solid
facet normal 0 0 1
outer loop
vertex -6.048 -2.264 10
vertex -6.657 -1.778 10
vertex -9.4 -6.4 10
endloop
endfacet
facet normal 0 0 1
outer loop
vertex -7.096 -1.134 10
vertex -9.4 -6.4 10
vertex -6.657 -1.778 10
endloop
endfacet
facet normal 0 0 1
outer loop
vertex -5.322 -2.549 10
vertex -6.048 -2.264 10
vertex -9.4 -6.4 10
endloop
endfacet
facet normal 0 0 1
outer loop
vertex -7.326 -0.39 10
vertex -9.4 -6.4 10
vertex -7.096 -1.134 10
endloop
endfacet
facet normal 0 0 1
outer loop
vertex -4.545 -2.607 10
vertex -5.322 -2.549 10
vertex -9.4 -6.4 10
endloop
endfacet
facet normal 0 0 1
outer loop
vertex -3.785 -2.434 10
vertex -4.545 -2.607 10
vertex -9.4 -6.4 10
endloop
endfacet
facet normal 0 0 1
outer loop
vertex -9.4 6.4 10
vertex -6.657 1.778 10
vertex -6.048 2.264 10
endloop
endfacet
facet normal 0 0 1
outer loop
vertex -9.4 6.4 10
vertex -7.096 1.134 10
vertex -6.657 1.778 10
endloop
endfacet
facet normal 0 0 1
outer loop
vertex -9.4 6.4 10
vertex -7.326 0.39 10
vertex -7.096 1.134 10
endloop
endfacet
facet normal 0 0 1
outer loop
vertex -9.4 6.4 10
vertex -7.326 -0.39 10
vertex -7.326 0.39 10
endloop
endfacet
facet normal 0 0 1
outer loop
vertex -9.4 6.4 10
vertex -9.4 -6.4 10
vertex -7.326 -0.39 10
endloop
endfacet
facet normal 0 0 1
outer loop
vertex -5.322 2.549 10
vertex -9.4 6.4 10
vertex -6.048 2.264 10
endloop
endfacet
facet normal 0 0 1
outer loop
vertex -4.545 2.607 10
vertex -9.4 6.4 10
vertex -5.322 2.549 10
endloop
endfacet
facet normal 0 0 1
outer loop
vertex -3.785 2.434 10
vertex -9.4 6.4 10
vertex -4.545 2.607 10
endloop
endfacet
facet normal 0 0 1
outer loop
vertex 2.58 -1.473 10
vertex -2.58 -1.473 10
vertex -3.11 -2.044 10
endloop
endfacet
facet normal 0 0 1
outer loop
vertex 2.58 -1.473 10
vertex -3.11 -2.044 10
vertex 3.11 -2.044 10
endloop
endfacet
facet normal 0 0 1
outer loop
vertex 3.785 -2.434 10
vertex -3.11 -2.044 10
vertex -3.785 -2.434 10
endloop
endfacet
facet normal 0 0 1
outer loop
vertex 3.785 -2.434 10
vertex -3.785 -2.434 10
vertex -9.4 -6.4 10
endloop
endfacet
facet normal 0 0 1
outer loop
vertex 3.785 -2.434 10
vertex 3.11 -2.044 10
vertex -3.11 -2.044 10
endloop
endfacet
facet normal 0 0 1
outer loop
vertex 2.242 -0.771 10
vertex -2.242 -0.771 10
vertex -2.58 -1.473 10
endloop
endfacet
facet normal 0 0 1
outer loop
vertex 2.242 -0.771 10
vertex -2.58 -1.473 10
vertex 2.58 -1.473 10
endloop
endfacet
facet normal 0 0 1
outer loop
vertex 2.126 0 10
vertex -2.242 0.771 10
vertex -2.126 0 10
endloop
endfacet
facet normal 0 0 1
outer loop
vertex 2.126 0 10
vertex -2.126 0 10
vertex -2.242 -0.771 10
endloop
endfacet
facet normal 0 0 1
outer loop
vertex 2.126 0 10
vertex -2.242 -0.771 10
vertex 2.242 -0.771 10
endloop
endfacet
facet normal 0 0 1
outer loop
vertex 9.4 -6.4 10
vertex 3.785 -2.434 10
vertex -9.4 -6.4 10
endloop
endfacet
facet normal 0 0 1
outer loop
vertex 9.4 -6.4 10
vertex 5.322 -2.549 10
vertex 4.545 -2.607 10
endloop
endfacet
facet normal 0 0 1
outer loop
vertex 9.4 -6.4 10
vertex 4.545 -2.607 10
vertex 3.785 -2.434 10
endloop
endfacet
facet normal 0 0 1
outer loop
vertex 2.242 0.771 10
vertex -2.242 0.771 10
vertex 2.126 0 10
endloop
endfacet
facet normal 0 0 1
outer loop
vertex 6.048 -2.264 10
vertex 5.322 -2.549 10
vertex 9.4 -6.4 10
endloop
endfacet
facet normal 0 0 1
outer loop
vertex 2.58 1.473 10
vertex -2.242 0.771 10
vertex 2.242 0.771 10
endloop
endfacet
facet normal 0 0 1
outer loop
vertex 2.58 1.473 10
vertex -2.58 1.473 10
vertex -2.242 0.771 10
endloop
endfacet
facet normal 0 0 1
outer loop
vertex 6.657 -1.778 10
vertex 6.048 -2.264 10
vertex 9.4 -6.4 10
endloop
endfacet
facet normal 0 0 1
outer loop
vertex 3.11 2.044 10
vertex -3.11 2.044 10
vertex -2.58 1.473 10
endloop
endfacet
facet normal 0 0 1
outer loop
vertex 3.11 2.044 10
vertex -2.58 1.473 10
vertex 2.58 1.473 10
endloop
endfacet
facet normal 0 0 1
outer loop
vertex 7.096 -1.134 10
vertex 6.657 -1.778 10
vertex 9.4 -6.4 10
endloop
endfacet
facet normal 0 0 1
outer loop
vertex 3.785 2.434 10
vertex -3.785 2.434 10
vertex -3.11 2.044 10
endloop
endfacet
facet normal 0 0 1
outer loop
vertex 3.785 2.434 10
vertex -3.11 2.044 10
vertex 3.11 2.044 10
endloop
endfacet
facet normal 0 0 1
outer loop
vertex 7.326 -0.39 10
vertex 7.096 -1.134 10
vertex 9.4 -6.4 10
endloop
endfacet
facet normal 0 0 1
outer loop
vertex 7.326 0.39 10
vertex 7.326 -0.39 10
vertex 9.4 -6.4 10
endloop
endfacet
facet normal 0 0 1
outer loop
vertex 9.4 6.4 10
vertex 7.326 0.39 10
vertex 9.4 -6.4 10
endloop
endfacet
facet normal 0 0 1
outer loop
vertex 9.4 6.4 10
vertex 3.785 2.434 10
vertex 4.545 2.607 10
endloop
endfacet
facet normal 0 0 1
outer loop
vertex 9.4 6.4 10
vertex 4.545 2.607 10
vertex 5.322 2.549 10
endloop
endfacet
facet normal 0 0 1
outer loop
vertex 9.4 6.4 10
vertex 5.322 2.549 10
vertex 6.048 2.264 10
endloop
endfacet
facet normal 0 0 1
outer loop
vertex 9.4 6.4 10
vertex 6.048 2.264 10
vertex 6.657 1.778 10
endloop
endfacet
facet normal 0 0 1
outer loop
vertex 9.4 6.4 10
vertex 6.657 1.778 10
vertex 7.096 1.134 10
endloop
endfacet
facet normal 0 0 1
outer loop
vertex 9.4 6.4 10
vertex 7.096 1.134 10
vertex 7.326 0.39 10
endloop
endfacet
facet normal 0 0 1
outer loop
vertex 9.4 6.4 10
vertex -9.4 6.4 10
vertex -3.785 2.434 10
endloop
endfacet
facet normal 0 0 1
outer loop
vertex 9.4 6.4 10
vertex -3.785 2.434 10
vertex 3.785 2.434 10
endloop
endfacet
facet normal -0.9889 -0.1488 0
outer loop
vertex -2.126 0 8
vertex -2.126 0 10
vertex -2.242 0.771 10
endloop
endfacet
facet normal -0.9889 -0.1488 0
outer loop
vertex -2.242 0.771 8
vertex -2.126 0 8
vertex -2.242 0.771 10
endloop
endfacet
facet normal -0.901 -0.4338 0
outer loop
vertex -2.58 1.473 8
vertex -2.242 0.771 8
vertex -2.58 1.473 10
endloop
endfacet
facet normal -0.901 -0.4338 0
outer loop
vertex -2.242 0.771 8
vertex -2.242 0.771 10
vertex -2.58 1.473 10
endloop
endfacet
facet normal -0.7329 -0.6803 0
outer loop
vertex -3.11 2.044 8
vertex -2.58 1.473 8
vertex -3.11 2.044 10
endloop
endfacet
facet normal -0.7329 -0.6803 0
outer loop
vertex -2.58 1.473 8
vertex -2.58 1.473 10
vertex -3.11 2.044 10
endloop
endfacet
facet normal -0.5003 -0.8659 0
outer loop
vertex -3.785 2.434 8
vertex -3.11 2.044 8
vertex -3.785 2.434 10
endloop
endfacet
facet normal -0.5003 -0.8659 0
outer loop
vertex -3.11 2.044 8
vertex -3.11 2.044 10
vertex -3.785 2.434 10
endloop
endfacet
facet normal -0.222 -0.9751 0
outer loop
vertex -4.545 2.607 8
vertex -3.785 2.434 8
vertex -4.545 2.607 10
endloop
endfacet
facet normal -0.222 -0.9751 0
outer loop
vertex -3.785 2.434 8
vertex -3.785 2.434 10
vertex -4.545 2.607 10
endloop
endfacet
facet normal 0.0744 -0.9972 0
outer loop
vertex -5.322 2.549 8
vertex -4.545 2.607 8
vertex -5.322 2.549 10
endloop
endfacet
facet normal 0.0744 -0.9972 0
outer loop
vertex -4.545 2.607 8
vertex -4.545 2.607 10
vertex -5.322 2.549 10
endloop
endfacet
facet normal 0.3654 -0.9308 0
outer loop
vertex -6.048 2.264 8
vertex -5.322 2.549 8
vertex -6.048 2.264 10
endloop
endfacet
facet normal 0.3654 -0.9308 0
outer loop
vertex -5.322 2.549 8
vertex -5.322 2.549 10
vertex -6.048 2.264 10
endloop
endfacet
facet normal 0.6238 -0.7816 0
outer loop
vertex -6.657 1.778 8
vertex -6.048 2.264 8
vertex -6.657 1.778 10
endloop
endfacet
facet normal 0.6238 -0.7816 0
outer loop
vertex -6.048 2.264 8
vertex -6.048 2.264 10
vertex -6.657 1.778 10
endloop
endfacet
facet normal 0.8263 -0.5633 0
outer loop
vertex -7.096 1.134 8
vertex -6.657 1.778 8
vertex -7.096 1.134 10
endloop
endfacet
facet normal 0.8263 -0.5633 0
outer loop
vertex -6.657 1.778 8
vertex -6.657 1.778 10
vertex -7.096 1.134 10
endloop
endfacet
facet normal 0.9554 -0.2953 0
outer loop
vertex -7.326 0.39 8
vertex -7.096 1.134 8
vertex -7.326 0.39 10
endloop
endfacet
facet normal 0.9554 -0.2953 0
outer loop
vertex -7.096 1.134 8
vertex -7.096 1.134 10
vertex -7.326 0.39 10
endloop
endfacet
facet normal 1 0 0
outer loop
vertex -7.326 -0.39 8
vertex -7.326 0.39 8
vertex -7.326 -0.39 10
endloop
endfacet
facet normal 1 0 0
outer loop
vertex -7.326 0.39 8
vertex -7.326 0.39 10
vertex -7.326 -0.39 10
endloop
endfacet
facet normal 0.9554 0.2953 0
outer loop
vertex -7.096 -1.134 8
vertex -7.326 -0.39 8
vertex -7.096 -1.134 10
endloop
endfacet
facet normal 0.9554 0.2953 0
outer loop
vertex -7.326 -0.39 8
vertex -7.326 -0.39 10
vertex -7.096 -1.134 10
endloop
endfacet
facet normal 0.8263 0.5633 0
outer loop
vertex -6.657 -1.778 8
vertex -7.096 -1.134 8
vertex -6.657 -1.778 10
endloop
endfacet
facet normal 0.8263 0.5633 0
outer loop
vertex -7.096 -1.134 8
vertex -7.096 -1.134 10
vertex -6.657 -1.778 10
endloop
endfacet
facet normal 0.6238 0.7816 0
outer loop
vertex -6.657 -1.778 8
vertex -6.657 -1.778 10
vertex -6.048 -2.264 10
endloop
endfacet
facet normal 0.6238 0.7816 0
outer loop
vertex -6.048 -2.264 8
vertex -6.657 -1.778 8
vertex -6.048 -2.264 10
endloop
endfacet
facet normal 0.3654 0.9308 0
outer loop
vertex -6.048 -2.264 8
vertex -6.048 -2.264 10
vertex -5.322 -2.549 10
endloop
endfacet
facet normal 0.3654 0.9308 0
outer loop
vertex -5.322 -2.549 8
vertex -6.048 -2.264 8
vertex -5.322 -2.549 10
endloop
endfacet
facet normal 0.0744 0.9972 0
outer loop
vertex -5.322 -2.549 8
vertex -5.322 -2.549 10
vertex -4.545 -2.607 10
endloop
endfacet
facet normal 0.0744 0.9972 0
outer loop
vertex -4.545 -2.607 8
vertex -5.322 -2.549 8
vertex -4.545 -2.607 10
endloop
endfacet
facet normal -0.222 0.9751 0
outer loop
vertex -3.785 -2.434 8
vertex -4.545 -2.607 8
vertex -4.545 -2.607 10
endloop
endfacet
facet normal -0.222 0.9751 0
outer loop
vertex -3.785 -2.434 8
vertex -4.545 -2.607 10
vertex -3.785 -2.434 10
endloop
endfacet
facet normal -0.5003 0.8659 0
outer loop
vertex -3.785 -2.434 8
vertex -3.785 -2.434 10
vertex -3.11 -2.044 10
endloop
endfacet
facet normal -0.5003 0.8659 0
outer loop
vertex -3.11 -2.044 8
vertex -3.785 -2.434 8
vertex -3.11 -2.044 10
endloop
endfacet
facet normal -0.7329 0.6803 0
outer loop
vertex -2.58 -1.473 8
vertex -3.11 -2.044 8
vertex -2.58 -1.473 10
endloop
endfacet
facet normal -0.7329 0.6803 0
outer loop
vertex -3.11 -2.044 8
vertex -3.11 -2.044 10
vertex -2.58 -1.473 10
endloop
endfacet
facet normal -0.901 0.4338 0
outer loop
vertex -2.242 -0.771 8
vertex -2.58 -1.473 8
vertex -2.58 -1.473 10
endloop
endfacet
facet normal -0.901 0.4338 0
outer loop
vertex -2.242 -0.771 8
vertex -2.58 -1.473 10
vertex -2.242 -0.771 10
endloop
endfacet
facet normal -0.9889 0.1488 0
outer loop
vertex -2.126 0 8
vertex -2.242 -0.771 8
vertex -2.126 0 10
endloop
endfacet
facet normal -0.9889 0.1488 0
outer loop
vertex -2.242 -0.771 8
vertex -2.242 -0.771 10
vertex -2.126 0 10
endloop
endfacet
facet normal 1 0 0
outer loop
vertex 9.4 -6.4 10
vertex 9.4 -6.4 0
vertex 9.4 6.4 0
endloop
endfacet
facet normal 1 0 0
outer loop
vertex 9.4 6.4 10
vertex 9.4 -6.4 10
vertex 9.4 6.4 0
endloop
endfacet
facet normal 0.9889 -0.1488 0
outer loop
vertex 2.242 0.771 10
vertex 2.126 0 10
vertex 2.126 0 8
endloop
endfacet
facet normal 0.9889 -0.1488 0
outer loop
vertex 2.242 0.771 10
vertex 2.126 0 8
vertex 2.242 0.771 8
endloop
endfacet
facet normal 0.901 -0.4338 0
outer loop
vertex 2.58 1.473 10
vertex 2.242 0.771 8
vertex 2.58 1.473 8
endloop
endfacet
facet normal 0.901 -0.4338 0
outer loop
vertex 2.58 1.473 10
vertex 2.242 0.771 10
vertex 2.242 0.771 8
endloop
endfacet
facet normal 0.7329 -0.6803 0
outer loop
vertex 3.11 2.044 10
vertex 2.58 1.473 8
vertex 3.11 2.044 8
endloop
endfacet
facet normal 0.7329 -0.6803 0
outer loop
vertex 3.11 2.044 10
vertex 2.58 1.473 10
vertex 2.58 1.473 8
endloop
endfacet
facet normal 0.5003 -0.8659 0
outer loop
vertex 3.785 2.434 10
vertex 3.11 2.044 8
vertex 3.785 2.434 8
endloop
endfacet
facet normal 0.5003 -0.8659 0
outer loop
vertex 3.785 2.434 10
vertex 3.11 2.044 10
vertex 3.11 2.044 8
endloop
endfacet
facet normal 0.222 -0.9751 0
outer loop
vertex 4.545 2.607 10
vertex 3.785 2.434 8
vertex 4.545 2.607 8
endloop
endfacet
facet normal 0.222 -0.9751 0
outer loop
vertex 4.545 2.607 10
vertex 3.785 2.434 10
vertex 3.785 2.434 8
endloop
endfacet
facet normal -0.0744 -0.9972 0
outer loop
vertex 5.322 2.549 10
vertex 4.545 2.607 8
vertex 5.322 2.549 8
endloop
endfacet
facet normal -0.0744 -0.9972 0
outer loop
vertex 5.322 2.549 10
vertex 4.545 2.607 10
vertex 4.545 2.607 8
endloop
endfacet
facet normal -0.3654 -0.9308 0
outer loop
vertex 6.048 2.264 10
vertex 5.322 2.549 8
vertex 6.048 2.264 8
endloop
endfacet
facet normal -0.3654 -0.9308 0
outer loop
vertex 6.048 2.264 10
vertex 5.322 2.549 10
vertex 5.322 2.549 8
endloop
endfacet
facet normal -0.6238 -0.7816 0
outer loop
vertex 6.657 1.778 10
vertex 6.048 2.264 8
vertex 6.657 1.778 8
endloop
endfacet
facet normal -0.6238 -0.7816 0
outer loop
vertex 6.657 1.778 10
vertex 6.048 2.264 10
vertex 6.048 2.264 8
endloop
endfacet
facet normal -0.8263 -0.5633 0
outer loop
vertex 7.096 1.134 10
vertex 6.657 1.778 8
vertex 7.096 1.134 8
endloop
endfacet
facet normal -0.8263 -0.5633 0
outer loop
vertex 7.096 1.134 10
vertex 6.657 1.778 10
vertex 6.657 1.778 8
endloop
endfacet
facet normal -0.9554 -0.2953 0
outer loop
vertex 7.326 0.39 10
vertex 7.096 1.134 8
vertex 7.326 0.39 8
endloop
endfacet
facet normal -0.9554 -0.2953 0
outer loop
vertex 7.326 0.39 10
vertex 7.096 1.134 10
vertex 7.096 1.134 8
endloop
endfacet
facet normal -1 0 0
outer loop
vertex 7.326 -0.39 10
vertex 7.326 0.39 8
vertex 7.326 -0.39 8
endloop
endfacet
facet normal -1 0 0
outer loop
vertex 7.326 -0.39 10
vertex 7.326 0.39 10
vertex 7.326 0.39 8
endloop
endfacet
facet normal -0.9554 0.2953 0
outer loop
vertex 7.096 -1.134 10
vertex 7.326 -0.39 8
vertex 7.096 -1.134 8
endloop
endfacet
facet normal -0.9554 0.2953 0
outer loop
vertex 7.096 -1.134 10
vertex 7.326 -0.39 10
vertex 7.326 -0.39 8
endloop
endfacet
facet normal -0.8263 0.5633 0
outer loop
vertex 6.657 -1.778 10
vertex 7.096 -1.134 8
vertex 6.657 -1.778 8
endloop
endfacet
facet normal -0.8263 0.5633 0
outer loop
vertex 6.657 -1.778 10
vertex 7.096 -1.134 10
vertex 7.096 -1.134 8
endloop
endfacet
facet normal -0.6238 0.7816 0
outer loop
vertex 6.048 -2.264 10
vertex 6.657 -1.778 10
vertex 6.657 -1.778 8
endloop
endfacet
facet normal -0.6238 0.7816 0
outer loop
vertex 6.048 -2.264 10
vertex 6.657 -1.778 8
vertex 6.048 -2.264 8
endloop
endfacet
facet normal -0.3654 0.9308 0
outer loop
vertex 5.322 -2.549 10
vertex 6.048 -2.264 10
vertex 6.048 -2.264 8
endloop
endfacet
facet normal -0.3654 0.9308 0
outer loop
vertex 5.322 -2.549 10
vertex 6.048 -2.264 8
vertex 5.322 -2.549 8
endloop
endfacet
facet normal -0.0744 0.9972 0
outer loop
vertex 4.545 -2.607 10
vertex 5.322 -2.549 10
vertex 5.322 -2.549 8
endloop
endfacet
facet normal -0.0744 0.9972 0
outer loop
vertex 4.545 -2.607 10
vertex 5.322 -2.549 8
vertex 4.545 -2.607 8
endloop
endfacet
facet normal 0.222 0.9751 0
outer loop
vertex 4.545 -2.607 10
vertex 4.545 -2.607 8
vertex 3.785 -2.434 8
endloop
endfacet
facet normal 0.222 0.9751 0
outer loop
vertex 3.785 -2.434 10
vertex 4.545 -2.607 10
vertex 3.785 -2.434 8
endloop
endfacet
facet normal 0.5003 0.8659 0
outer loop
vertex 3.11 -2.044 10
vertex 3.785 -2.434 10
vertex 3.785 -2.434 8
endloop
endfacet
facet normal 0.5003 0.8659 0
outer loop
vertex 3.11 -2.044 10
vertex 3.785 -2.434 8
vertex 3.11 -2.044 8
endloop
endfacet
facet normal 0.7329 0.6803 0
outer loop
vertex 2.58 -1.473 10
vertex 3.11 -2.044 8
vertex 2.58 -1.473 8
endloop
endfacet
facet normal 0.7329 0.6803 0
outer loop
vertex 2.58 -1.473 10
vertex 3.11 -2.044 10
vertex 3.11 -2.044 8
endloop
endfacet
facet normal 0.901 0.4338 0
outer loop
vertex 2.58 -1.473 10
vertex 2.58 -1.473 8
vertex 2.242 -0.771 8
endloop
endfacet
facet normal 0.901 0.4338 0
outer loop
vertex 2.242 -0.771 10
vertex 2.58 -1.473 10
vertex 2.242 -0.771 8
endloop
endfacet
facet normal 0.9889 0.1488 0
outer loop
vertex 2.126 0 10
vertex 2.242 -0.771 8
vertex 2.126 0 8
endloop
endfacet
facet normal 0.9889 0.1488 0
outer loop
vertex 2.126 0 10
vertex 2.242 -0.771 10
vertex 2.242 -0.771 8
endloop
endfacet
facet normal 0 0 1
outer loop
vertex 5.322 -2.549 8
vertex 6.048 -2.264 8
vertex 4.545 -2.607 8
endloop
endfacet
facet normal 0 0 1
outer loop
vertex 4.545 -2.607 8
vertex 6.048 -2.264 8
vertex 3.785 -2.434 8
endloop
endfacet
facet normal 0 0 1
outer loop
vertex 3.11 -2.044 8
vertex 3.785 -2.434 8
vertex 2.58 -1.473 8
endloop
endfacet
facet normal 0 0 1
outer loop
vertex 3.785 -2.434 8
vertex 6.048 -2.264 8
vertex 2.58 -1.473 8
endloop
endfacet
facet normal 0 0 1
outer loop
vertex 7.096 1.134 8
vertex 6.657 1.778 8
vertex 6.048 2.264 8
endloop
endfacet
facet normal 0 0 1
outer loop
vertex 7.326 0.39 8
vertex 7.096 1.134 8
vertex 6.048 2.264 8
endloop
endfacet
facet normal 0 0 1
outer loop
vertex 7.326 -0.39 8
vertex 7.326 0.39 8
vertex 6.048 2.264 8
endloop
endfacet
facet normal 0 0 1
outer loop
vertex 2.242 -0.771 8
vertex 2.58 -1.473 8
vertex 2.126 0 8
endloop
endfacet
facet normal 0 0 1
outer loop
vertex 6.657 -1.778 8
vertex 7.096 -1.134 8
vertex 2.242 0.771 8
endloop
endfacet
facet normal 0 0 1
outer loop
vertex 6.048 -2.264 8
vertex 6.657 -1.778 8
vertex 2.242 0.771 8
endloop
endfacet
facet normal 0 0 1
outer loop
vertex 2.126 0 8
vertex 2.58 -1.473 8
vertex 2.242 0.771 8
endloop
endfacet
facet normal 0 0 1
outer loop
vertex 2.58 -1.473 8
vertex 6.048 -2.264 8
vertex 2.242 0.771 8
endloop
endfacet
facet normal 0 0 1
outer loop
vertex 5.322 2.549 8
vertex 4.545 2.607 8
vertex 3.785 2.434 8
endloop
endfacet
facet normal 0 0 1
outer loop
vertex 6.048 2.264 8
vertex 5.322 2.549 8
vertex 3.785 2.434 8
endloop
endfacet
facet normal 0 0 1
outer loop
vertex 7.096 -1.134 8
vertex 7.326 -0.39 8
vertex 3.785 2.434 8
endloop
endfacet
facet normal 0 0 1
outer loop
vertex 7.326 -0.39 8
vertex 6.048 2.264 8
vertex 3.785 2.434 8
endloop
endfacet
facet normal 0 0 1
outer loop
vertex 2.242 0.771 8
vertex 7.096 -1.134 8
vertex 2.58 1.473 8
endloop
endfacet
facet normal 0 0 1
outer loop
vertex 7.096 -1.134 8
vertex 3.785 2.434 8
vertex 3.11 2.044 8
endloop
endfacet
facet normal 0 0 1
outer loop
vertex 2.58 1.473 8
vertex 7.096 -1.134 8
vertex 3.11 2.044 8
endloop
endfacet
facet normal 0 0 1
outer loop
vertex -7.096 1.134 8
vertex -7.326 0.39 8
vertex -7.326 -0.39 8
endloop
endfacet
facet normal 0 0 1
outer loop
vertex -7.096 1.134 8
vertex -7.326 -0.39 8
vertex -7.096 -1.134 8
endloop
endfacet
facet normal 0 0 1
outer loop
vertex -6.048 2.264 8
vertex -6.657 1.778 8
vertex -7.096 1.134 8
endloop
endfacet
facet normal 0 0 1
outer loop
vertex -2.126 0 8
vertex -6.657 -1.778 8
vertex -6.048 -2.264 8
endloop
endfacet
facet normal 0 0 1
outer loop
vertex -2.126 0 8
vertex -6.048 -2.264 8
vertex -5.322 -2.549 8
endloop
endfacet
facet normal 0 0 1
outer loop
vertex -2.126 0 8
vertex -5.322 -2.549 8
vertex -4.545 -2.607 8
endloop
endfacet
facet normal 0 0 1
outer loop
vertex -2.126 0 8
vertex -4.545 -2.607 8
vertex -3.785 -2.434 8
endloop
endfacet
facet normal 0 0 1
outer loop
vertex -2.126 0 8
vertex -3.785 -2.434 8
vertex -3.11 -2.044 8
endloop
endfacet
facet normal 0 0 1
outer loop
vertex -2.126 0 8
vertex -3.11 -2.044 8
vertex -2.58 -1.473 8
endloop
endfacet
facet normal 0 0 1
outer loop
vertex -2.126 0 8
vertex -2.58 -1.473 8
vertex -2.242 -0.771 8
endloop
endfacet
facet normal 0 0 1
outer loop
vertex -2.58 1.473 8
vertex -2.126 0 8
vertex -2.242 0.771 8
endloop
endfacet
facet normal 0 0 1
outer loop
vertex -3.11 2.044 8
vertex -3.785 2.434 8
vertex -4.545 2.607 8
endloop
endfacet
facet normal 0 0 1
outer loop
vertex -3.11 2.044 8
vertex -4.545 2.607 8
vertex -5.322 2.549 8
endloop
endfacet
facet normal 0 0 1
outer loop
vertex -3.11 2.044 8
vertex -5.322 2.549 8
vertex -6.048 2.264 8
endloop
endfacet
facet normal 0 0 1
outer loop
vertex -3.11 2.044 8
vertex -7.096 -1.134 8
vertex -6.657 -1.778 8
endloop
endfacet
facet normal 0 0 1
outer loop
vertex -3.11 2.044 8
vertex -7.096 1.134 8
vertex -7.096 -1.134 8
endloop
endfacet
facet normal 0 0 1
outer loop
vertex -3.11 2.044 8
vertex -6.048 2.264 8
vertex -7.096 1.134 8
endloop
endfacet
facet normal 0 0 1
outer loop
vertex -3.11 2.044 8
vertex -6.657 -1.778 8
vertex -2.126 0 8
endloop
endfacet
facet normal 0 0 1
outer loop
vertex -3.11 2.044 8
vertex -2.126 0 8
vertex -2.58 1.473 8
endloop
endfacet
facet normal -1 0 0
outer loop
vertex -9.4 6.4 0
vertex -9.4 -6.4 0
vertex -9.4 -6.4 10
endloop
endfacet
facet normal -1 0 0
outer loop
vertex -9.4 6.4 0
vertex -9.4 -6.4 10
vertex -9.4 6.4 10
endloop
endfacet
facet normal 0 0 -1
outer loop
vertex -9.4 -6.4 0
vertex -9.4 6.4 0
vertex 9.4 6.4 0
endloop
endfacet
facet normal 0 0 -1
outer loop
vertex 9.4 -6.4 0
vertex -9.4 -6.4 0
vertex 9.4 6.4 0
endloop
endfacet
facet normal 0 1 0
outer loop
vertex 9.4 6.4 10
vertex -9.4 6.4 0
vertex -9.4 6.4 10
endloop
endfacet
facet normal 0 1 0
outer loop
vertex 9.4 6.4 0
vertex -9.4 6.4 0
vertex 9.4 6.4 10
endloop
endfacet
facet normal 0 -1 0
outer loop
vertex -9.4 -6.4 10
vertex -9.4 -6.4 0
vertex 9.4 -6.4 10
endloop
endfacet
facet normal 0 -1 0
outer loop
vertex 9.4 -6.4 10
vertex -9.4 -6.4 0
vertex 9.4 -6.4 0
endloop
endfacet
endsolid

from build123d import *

# Parameters (mm, degrees)
CROQUIS1_W              = 18.8
CROQUIS1_H              = 12.8
SALIENTE_EXTRUIR1_DEPTH = 10
CROQUIS2_R              = 2.614642897
CORTAR_EXTRUIR1_DEPTH   = 2


with BuildPart() as part:
    # Croquis1 → Saliente-Extruir1 (new body)
    with BuildSketch(Plane.XY):
        Rectangle(CROQUIS1_W, CROQUIS1_H)
    extrude(amount=SALIENTE_EXTRUIR1_DEPTH)

    # Croquis2 → Cortar-Extruir1 (cut)
    with BuildSketch(Plane.XY.offset(10)):
        with Locations((-4.740668899, 0)):
            Circle(CROQUIS2_R)
    cortar_extruir1 = extrude(amount=-CORTAR_EXTRUIR1_DEPTH, mode=Mode.SUBTRACT)

    # Simetría1: Cortar-Extruir1 across plane
    add(cortar_extruir1.mirror(Plane(origin=(0, 0, 0), x_dir=(0, 0, 1), z_dir=(1, 0, 0))), mode=Mode.SUBTRACT)


solid = part.part
